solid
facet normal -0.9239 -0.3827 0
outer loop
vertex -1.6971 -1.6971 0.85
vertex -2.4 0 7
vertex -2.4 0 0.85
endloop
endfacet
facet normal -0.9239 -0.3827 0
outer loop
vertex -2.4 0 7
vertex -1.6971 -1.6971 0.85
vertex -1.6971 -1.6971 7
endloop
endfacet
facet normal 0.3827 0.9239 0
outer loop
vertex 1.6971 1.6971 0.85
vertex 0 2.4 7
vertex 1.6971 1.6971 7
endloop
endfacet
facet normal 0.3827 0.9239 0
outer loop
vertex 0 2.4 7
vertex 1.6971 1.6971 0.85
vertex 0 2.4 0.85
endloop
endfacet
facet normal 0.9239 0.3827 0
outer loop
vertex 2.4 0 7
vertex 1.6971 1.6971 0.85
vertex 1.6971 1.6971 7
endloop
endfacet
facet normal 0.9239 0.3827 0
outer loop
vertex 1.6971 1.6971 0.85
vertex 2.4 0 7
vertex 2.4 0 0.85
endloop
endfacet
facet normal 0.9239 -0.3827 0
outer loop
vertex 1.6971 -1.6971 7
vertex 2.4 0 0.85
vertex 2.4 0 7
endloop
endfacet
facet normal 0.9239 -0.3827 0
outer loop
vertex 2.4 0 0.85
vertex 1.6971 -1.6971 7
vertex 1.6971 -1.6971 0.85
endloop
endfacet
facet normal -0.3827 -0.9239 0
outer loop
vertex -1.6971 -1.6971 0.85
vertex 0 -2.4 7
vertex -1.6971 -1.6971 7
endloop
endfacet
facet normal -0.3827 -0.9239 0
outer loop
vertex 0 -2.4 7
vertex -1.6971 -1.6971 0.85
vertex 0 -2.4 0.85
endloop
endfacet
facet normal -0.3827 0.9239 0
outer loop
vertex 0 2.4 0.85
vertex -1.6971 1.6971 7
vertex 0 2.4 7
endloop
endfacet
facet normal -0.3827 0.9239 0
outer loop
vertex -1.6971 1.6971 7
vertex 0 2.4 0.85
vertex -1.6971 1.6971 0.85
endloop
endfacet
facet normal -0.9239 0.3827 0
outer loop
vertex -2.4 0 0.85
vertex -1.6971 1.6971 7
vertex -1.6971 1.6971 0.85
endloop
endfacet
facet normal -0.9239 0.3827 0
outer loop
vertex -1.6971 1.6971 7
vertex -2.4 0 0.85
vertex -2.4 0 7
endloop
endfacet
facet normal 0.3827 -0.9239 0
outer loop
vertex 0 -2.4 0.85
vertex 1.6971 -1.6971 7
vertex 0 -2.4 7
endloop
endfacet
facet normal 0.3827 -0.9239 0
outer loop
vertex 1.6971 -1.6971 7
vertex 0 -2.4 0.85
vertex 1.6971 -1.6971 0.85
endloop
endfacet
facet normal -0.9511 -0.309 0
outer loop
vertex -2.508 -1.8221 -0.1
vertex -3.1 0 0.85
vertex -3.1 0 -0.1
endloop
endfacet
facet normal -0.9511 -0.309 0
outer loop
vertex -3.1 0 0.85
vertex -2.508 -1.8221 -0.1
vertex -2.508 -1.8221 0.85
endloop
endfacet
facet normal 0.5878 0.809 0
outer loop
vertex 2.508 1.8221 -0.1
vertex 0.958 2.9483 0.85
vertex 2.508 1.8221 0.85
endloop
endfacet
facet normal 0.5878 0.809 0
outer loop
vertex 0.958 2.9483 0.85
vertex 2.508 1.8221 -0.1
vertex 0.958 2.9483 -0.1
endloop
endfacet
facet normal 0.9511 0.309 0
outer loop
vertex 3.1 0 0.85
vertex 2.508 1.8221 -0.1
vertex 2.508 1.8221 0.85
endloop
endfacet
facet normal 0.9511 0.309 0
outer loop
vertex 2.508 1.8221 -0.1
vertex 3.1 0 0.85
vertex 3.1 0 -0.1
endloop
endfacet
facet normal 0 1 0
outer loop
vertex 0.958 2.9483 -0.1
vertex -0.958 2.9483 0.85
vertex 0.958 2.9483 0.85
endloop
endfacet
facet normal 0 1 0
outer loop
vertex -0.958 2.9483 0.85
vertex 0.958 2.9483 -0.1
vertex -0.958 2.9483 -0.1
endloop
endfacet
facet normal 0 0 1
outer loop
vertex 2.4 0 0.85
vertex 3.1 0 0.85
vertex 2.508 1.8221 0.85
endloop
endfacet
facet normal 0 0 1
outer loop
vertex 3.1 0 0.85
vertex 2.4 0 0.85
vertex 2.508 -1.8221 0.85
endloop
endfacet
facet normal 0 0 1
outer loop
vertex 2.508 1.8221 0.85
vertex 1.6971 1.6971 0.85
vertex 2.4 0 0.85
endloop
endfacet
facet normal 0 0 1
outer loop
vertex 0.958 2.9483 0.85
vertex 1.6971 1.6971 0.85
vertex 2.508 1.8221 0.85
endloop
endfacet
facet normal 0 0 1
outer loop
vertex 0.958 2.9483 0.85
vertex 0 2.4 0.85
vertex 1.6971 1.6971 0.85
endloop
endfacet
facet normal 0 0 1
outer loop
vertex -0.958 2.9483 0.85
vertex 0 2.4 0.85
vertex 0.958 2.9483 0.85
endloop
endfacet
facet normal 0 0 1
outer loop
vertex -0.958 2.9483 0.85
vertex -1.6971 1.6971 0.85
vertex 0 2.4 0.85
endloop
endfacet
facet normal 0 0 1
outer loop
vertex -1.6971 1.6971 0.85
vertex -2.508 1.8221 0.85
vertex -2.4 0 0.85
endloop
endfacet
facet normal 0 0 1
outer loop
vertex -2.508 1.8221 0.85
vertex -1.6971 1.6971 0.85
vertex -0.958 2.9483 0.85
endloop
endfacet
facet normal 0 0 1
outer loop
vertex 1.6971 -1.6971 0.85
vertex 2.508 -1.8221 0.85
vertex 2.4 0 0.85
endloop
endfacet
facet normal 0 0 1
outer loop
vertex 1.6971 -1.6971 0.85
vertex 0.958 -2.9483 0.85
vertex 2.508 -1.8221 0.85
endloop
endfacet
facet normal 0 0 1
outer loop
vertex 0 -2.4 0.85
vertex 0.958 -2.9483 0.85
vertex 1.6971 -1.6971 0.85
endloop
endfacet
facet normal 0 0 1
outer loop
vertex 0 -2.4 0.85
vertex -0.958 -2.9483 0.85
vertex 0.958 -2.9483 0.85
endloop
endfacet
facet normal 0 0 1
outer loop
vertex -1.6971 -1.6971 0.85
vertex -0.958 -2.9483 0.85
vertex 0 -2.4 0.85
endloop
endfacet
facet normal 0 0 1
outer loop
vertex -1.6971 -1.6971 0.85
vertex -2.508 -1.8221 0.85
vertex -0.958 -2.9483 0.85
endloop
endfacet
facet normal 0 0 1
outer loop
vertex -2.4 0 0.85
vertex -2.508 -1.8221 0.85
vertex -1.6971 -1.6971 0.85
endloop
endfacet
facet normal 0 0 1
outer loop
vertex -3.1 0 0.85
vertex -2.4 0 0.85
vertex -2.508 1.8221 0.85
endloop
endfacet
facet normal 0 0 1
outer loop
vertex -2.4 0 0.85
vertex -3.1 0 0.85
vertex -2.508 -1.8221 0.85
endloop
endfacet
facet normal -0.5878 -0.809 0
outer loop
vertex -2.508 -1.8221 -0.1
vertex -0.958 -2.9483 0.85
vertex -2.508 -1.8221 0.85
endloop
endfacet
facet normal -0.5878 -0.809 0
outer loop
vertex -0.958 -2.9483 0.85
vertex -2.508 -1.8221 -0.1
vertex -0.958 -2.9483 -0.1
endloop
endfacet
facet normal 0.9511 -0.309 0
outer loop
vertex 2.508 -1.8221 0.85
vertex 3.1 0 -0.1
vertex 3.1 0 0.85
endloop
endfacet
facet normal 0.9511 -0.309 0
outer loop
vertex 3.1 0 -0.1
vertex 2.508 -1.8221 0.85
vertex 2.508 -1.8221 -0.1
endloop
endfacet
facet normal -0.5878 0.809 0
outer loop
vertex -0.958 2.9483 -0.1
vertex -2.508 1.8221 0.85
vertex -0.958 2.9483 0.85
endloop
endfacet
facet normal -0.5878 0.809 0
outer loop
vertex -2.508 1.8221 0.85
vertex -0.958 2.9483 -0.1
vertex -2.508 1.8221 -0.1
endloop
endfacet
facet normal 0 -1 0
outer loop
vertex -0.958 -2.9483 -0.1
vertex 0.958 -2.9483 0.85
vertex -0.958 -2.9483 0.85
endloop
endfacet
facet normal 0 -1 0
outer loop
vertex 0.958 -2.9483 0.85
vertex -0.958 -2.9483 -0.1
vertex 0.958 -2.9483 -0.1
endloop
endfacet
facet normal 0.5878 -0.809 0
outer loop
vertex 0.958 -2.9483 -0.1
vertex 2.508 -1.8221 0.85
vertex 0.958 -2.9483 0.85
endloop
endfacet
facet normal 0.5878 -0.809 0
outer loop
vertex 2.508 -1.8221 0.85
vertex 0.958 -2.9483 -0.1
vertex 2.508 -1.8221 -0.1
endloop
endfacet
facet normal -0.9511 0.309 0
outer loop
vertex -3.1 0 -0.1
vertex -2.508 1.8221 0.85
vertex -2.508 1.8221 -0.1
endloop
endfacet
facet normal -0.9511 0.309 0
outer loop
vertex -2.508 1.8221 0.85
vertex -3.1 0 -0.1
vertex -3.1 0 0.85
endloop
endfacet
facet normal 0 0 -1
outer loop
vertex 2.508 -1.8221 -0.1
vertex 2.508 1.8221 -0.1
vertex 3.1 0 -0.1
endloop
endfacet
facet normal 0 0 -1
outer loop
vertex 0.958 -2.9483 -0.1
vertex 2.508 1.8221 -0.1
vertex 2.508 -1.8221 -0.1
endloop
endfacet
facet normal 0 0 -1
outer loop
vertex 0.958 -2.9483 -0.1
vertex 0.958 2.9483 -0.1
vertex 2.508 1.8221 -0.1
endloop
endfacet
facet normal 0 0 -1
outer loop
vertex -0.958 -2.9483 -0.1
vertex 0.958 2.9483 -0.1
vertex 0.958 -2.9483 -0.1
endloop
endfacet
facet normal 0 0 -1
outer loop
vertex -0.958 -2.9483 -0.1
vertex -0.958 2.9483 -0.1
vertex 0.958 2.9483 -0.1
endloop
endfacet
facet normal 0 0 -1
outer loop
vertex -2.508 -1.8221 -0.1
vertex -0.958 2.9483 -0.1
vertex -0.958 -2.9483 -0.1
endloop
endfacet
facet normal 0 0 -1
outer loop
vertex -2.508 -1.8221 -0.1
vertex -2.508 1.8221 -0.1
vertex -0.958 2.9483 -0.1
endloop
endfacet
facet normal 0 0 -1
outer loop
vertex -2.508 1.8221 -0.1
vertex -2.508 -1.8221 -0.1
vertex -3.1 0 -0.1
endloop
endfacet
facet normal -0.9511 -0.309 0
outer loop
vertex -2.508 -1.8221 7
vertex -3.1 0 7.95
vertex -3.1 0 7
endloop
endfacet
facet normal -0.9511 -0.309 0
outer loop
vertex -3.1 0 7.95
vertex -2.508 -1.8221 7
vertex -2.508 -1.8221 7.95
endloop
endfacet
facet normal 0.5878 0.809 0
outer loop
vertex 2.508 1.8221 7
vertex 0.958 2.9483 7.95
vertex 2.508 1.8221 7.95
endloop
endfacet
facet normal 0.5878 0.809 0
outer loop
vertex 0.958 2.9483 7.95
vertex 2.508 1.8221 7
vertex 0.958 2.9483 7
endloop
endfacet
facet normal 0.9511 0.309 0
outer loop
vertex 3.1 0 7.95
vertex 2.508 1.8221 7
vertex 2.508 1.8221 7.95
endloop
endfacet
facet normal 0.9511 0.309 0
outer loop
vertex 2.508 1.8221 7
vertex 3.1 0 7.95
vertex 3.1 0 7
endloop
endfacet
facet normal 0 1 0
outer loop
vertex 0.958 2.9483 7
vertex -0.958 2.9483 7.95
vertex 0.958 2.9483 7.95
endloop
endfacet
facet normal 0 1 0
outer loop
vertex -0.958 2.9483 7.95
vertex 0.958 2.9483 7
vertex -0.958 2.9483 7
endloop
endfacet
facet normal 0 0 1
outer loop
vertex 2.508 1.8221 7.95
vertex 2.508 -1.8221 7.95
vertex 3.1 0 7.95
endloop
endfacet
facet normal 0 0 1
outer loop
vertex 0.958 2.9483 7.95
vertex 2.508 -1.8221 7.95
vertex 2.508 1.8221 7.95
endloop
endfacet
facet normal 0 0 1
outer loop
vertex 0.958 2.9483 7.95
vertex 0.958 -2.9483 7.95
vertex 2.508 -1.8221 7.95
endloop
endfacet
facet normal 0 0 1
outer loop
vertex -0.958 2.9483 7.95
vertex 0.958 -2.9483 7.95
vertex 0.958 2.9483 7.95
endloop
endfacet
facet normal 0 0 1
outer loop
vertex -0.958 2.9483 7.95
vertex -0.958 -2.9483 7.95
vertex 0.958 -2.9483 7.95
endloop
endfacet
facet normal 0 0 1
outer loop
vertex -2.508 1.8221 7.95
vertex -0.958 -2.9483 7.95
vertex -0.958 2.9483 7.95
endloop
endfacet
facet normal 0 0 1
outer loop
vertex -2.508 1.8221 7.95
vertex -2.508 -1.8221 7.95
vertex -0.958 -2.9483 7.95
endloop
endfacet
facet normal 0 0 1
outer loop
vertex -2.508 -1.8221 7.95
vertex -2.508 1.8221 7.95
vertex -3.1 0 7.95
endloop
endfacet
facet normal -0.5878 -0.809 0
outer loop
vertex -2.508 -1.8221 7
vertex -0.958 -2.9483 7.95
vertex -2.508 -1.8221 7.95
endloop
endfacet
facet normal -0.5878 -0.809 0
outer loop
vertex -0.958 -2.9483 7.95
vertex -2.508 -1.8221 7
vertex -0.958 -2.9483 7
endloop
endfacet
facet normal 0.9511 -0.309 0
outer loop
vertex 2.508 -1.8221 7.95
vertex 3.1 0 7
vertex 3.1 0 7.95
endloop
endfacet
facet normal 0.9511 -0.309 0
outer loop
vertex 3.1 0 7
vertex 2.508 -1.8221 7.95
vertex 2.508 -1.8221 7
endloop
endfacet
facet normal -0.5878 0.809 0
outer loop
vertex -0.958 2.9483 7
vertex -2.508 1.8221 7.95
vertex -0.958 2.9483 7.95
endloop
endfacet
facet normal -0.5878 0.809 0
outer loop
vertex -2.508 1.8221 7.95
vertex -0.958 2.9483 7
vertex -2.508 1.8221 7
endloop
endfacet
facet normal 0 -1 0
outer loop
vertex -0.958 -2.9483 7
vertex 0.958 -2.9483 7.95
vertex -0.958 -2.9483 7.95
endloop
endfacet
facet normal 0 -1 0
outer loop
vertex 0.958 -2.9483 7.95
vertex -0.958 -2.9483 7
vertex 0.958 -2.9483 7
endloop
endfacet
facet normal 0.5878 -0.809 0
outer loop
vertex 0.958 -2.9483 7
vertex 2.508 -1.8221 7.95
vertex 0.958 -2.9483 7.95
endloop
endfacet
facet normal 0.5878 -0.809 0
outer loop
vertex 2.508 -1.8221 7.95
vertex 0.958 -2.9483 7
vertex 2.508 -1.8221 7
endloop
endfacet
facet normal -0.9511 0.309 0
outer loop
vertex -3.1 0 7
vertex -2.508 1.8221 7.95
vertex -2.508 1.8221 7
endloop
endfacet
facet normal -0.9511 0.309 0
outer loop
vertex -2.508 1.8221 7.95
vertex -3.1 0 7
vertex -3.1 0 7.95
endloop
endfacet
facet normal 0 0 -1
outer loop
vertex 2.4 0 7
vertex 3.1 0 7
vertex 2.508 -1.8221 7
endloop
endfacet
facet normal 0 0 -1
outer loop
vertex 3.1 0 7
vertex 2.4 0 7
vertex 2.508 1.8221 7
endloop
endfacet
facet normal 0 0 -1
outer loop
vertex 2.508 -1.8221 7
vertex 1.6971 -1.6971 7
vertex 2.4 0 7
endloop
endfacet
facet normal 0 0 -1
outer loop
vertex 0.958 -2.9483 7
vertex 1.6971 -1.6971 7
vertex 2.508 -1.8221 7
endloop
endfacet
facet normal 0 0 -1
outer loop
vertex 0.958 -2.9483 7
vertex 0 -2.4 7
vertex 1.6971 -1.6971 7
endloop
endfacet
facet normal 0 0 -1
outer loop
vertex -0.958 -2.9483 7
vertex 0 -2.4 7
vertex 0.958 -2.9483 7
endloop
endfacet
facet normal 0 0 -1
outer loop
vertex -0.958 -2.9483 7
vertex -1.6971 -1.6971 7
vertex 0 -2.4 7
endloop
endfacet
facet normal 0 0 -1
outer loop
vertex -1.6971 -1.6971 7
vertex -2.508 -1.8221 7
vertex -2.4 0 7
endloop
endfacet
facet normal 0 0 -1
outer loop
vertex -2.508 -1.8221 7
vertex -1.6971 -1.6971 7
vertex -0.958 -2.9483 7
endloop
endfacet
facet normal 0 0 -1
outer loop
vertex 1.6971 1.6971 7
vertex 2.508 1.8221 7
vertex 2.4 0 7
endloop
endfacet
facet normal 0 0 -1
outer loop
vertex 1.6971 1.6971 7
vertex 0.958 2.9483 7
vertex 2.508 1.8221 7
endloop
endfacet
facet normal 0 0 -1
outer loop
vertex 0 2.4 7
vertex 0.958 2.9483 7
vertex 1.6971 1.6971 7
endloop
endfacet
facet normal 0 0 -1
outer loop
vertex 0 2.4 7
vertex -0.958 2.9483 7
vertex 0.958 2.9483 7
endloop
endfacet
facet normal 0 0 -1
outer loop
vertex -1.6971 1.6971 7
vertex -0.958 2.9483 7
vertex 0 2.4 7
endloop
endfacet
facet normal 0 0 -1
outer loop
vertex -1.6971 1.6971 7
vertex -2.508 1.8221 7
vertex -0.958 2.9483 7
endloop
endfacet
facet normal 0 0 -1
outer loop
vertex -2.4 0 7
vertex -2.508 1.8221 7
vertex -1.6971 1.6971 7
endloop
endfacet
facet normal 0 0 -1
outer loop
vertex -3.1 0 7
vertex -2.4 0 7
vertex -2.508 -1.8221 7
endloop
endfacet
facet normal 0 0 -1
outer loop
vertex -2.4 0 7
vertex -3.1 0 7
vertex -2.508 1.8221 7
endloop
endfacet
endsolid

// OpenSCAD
module liftarm_loch ()
{
  t   = 7.85; // Tiefe des Liftarms
  D   = 4.8;  // Durchmesser Loch
  D_a = 6.2;
  t_a = 0.85;

  j = 0.1;   // jiffy 

  cylinder (h = t, d = D);

  translate ([0, 0, -j])
    cylinder (h = t_a + j, d = D_a);

  translate ([0, 0, t - t_a])
    cylinder (h = t_a + j, d = D_a);
}

liftarm_loch ();
